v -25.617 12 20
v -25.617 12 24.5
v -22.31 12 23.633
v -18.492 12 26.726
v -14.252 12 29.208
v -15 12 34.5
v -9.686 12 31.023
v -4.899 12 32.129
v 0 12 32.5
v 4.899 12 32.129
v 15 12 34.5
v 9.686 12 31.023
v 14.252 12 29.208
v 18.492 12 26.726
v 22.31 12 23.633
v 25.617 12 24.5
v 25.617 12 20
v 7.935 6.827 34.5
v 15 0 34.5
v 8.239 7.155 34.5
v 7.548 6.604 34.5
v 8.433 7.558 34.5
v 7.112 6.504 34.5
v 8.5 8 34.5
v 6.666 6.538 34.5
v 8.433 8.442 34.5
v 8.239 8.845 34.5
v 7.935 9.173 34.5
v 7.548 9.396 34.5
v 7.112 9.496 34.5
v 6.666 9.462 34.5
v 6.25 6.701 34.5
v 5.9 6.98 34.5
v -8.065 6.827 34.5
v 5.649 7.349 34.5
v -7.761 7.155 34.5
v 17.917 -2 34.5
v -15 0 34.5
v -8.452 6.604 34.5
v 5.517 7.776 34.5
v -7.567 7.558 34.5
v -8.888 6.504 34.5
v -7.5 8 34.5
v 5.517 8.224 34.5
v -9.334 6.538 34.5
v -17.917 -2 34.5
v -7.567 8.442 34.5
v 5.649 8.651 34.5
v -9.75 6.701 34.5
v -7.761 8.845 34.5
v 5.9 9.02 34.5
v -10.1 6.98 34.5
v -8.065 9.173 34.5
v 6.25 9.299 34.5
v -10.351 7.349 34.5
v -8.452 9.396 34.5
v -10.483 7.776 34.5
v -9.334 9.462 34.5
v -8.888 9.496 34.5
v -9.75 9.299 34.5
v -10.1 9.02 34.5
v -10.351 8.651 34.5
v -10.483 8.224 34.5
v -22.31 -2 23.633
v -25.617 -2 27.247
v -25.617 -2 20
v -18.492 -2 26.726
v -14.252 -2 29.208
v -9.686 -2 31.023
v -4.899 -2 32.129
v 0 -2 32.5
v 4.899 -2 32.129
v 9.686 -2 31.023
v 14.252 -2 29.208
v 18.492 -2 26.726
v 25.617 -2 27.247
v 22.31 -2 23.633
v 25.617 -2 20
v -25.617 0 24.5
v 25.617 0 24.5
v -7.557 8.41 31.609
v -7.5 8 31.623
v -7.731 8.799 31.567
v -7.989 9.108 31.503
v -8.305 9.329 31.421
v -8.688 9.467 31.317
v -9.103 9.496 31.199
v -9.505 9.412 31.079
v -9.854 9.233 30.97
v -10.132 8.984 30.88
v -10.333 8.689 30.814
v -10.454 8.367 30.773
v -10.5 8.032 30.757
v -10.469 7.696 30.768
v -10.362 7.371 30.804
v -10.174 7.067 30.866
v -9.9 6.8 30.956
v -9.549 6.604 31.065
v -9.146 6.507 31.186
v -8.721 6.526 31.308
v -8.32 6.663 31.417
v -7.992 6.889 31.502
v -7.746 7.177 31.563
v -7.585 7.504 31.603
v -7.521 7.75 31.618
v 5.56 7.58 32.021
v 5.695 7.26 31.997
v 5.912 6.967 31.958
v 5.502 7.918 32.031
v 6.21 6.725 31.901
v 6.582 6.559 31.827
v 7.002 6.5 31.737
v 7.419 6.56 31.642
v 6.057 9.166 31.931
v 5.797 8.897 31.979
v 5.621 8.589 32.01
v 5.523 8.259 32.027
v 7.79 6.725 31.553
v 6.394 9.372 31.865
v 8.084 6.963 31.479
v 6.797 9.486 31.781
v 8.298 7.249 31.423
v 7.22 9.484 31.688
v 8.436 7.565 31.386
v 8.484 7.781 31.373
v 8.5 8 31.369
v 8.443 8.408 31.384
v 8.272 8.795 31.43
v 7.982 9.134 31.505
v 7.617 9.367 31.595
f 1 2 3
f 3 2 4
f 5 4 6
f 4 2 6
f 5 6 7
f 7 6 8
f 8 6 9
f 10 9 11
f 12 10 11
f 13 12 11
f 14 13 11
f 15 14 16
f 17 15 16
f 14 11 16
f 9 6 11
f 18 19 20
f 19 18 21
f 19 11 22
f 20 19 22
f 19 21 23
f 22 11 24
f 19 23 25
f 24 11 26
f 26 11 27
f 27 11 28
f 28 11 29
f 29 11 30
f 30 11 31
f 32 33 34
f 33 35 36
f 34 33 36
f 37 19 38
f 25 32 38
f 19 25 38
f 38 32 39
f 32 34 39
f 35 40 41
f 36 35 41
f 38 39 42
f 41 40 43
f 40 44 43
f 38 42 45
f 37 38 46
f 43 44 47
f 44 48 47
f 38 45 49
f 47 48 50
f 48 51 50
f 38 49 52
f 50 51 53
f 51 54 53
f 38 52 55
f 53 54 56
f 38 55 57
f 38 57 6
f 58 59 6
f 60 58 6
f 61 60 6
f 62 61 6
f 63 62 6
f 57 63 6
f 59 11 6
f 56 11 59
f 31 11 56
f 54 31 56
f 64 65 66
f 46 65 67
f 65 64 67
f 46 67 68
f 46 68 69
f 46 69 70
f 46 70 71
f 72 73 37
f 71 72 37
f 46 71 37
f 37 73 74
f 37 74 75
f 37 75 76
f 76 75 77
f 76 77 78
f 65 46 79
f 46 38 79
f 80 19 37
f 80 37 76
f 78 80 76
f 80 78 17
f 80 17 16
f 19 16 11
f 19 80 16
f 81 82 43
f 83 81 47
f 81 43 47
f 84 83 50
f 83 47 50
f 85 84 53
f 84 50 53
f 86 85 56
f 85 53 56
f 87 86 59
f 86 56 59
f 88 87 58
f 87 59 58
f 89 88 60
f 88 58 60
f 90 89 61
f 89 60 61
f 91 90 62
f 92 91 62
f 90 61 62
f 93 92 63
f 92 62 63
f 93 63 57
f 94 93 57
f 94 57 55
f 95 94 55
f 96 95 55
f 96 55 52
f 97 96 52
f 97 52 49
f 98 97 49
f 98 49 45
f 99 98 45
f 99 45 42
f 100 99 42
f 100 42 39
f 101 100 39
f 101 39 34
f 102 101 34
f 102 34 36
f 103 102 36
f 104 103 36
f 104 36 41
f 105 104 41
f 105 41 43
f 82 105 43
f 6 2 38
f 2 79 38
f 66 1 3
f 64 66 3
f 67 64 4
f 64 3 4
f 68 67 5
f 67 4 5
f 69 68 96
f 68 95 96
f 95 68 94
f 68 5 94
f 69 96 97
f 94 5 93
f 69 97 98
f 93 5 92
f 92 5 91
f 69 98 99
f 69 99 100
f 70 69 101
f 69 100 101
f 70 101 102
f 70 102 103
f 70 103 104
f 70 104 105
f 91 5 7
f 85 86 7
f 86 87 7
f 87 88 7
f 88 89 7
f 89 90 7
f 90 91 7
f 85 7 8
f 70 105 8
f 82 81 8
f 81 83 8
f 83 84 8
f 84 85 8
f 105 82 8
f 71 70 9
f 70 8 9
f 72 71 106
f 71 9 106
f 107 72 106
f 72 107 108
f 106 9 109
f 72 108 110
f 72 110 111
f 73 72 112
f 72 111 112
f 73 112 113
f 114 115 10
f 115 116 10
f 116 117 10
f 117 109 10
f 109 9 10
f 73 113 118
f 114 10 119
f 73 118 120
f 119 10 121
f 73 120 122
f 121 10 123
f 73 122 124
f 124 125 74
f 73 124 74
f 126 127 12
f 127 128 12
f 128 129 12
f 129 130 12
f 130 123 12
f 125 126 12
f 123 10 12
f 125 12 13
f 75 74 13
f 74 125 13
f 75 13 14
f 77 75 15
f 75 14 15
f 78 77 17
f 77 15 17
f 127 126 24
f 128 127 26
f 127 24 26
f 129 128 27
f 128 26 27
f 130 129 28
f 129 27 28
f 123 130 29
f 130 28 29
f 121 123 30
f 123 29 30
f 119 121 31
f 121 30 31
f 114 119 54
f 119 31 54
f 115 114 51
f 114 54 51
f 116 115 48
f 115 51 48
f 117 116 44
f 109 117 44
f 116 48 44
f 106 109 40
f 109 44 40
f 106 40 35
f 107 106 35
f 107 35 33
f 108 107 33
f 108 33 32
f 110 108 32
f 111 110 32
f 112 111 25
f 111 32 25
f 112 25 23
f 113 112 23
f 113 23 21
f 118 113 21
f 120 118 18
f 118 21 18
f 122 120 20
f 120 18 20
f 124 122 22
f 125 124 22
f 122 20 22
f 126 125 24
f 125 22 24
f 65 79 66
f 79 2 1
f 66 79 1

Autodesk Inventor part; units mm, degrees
ref_plane "YZ Plane" through (0, 0, 0) normal (1, 0, 0) x (0, 1, 0)
ref_plane "XZ Plane" through (0, 0, 0) normal (0, 1, 0) x (-1, 0, 0)
ref_plane "XY Plane" through (0, 0, 0) normal (0, 0, 1) x (1, 0, 0)
ref_plane "Plano de trabajo1" through (16, 0, 22.5) normal (0, 0, -1) x (-1, 0, 0)
sketch "Boceto2" plane through (16, 0, 22.5) normal (0, 0, -1) x (-1, 0, 0)
  line L0 (-6.5, 0) -> (0, 0) projected
  line L1 (0, 0) -> (32, 0) projected
  circle A0 centre (8, 8) radius 1.5
  circle A1 centre (24, 8) radius 1.5
  point P0 (16, 0)
  dimension "d15" = 3
  dimension "d16" = 3
extrude "Extrusión2" [suppressed]
ref_plane "Plano de trabajo2" through (0, 0, 0) normal (0, -1, 0) x (1, 0, 0)
sketch "Boceto4" plane through (0, 0, 0) normal (0, -1, 0) x (1, 0, 0)
  circle A0 centre (0, 0) radius 32.5
  arc A1 (28.2887, 16) -> (-28.2887, 16) centre (0, 0) ccw projected
  line L0 (0, 32.5) -> (0, 34.5)
  line L1 (0, 34.5) -> (-26.2329, 34.5)
  line L2 (-26.2329, 34.5) -> (30.7149, 34.5)
  line L3 (0, 0) -> (0, 20)
  arc A2 (28.2887, 16) -> (-28.2887, 16) centre (0, 0) ccw projected
  line L4 (0, 20) -> (50, 20)
  line L5 (50, 20) -> (-50, 20)
  line L6 (0, 34.5) -> (15, 34.5)
  line L7 (15, 34.5) -> (25.6174, 20)
  line L8 (0, 34.5) -> (-15, 34.5)
  line L9 (-15, 34.5) -> (-25.6174, 20)
  point P0 (-25.6174, 20)
  dimension "d19" = 2
  dimension "d20" = 20
  dimension "d21" = 50
  dimension "d22" = 100
  dimension "d23" = 15
  dimension "d24" = 15
extrude "Extrusión3" add sketch "Boceto4" against normal blind 12 contours A0 L0 L2 L7 | L9 L1 L0 A0
sketch "Boceto5" plane through (-15, 0, 34.5) normal (0, 0, 1) x (1, 0, 0)
  line L0 (30, 0) -> (30, 12) projected
  line L1 (30, 0) -> (30, 8)
  line L2 (30, 8) -> (22, 8)
  line L3 (22, 8) -> (6, 8)
  circle A0 centre (22, 8) radius 1.5
  circle A1 centre (6, 8) radius 1.5
  point P0 (15, 0)
  dimension "d27" = 8
  dimension "d28" = 8
  dimension "d29" = 16
  dimension "d30" = 3
  dimension "d31" = 3
extrude "Extrusión4" cut sketch "Boceto5" against normal blind 12
sketch "Boceto6" plane through (0, 0, 0) normal (0, -1, 0) x (1, 0, 0)
  circle A0 centre (0, 0) radius 32.5
  arc A1 (25.6174, 20) -> (-25.6174, 20) centre (0, 0) ccw projected
  line L0 (-15, 34.5) -> (15, 34.5) projected
  line L1 (25.6174, 20) -> (15, 34.5)
  line L2 (15, 34.5) -> (-15, 34.5)
  line L3 (-15, 34.5) -> (-25.6174, 20)
extrude "Extrusión5" add sketch "Boceto6" along normal blind 2 contours A0 L3 L0 L1
sketch "Boceto7" plane through (0, -2, 0) normal (0, -1, 0) x (1, 0, 0)
  line L0 (-25.6174, 20) -> (-15, 34.5) projected
  line L1 (-15, 34.5) -> (-25.6174, 34.5)
  line L2 (-25.6174, 34.5) -> (-25.6174, 20)
  line L3 (-25.6174, 20) -> (25.6174, 20)
  line L4 (25.6174, 20) -> (25.6174, 34.5)
  line L5 (25.6174, 20) -> (15, 34.5) projected
  line L6 (15, 34.5) -> (25.6174, 34.5)
  circle A0 centre (0, 0) radius 32.5
  line L7 (-15, 34.5) -> (15, 34.5)
extrude "Extrusión6" add sketch "Boceto7" along normal blind 8 contours L2 L1 L0 | A0 L3 | L0 L7 L5 A0 | L5 L6 L4 picked at (-1.7193, 25.9173)
sketch "Boceto8" plane through (-15, 12, 34.5) normal (0, 0, 1) x (1, 0, 0)
  line L0 (40.6174, -22) -> (-10.6174, -22) projected
  line L1 (-10.6174, -22) -> (-10.6174, -42.5)
  line L2 (-10.6174, -42.5) -> (39.7361, -42.5)
  line L3 (40.6174, -22) -> (40.6174, -42.5)
  line L4 (40.6174, -42.5) -> (39.7361, -42.5)
  line L5 (-10.6174, -22) -> (40.6174, -22) projected
  line L6 (40.6174, -14) -> (40.6174, -22) projected
  line L7 (-10.6174, -22) -> (40.6174, -22)
  line L8 (15, -22) -> (35.2, -22)
  line L9 (35.2, -22) -> (35.2, -42.5)
  line L10 (15, -22) -> (-5.2, -22)
  line L11 (-5.2, -22) -> (-5.2, -42.5)
  line L12 (-5.2, -42.5) -> (-5.2, -37.5)
  line L13 (-5.2, -22) -> (-5.2, -29)
  line L14 (-5.2, -29) -> (-10.6174, -29)
  line L15 (-5.2, -42.5) -> (-5.2, -36.5)
  line L16 (-5.2, -36.5) -> (-10.6174, -36.5)
  point P0 (15, -12)
  dimension "d38" = 20.5
  dimension "d39" = 20.5
  dimension "d40" = 20.2
  dimension "d41" = 20.2
  dimension "d43" = 7
  dimension "d44" = 6
extrude "Extrusión7" add sketch "Boceto8" against normal blind 14.5 contours L3 L4 L2 L9 L0 | L11 L14 L1 L0 | L2 L1 L16 L11
sketch "Boceto9" plane through (20.2, -30.5, 34.5) normal (0, -1, 0) x (1, 0, 0)
  line L0 (5.4174, -14.5) -> (5.4174, 0) projected
  line L1 (-45.8174, 0) -> (-45.8174, -14.5) projected
  line L2 (5.4174, 0) -> (-45.8174, 0)
  line L3 (-45.8174, 0) -> (-45.8174, -14.5)
  line L4 (-45.8174, -14.5) -> (5.4174, -14.5)
  line L5 (5.4174, 0) -> (-5.2, 0) projected
  line L6 (5.4174, -14.5) -> (5.4174, 0)
  point P0 (-20.2, -34.5)
extrude "Extrusión8" add sketch "Boceto9" along normal blind 5
sketch "Boceto10" plane through (0, -2, 0) normal (0, 1, 0) x (1, 0, 0)
  line L0 (-15, -34.5) -> (-25.6174, -34.5) projected
  line L1 (-15, -34.5) -> (-25.6174, -34.5)
  line L2 (-25.6174, -34.5) -> (-25.6174, -24.5)
  line L3 (-25.6174, -34.5) -> (-25.6174, -20) projected
  line L4 (-25.6174, -24.5) -> (-15, -34.5)
  line L5 (-25.6174, -20) -> (25.6174, -20) projected
  line L6 (-25.6174, -24.5) -> (-25.6174, -20)
  line L7 (-25.6174, -20) -> (-15, -34.5)
  line L8 (-15, -34.5) -> (-25.6174, -20) projected
  arc A0 (-25.6174, -20) -> (25.6174, -20) centre (0, 0) ccw projected
  line L9 (0, -32.5) -> (0, -25.3096)
  line L10 (15, -34.5) -> (25.6174, -34.5)
  line L11 (25.6174, -34.5) -> (25.6174, -24.5)
  line L12 (25.6174, -34.5) -> (25.6174, -20)
  line L13 (25.6174, -24.5) -> (15, -34.5)
  line L14 (25.6174, -20) -> (15, -34.5)
  dimension "d49" = 10
extrude "Extrusión9" add sketch "Boceto10" along normal blind 14 contours L12 L13 L14 | L4 L3 L7
sketch "Boceto11" plane through (-25.6174, -17, 34.5) normal (0, 0, 1) x (1, 0, 0)
  line L0 (45.8174, 7) -> (45.8174, -13.5) projected
  line L1 (45.8174, -13.5) -> (45.8174, 7)
  line L2 (45.8174, 7) -> (45.8174, -3.25)
  point P0 (25.6174, 17)
chamfer "Chaflán1" distance 2 angle 45 2 edges at (20.3087, -2, 29.5) (-20.3087, -2, 29.5)
sketch "Boceto12" plane through (0, -2, 0) normal (0, 1, 0) x (1, 0, 0)
  line L0 (40.0402, -40.6139) -> (-53.4832, -40.6139)
  line L1 (-53.4832, -40.6139) -> (-53.4832, 20.2117)
  line L2 (-53.4832, 20.2117) -> (40.0402, 20.2117)
  line L3 (40.0402, 20.2117) -> (40.0402, -40.6139)
  point P0 (0, 0)
extrude "Extrusión10" cut sketch "Boceto12" against normal blind 100
sketch "Boceto14" plane through (-15, 12, 34.5) normal (0, 0, 1) x (1, 0, 0)
  line L0 (-2.917, -14) -> (32.917, -14) projected
  line L1 (40.6174, -14) -> (-10.6174, -14) projected
  line L2 (15, -14) -> (7.5, -14)
  line L3 (7.5, -14) -> (7.5, -34.2047)
  line L4 (7.5, -14) -> (17.5, -14)
  line L5 (17.5, -14) -> (17.5, -67.4)
  line L6 (17.5, -67.4) -> (-2.5, -67.4)
  line L7 (-2.917, -14) -> (0, -12) projected
  line L8 (7.5, -14) -> (-2.5, -14)
  line L9 (-2.5, -14) -> (-2.5, -67.4)
  line L10 (-2.5, -14) -> (-2.5, -16.6)
  line L11 (-2.5, -16.6) -> (2.55, -16.6)
  line L12 (2.55, -16.6) -> (12.45, -16.6)
  line L13 (12.45, -16.6) -> (17.5, -16.6)
  circle A0 centre (12.45, -16.6) radius 2.2
  circle A1 centre (0.025, -16.6) radius 2.2
  line L14 (17.5, -67.4) -> (17.5, -64.8)
  line L15 (17.5, -64.8) -> (12.45, -64.8)
  line L16 (12.45, -64.8) -> (2.55, -64.8)
  line L17 (2.55, -64.8) -> (-2.5, -64.8)
  circle A2 centre (12.45, -64.8) radius 2.2
  circle A3 centre (2.55, -64.8) radius 2.2
  point P0 (15, -12)
  dimension "d59" = 10
  dimension "d60" = 53.4
  dimension "d61" = 20
  dimension "d68" = 2.6
  dimension "d69" = 5.05
  dimension "d70" = 9.9
  dimension "d71" = 5.05
  dimension "d72" = 4.4
  dimension "d73" = 4.4
  dimension "d74" = 2.6
  dimension "d75" = 5.05
  dimension "d76" = 9.9
  dimension "d77" = 5.05
  dimension "d78" = 4.4
  dimension "d79" = 4.4
properties part number "to_wily"
